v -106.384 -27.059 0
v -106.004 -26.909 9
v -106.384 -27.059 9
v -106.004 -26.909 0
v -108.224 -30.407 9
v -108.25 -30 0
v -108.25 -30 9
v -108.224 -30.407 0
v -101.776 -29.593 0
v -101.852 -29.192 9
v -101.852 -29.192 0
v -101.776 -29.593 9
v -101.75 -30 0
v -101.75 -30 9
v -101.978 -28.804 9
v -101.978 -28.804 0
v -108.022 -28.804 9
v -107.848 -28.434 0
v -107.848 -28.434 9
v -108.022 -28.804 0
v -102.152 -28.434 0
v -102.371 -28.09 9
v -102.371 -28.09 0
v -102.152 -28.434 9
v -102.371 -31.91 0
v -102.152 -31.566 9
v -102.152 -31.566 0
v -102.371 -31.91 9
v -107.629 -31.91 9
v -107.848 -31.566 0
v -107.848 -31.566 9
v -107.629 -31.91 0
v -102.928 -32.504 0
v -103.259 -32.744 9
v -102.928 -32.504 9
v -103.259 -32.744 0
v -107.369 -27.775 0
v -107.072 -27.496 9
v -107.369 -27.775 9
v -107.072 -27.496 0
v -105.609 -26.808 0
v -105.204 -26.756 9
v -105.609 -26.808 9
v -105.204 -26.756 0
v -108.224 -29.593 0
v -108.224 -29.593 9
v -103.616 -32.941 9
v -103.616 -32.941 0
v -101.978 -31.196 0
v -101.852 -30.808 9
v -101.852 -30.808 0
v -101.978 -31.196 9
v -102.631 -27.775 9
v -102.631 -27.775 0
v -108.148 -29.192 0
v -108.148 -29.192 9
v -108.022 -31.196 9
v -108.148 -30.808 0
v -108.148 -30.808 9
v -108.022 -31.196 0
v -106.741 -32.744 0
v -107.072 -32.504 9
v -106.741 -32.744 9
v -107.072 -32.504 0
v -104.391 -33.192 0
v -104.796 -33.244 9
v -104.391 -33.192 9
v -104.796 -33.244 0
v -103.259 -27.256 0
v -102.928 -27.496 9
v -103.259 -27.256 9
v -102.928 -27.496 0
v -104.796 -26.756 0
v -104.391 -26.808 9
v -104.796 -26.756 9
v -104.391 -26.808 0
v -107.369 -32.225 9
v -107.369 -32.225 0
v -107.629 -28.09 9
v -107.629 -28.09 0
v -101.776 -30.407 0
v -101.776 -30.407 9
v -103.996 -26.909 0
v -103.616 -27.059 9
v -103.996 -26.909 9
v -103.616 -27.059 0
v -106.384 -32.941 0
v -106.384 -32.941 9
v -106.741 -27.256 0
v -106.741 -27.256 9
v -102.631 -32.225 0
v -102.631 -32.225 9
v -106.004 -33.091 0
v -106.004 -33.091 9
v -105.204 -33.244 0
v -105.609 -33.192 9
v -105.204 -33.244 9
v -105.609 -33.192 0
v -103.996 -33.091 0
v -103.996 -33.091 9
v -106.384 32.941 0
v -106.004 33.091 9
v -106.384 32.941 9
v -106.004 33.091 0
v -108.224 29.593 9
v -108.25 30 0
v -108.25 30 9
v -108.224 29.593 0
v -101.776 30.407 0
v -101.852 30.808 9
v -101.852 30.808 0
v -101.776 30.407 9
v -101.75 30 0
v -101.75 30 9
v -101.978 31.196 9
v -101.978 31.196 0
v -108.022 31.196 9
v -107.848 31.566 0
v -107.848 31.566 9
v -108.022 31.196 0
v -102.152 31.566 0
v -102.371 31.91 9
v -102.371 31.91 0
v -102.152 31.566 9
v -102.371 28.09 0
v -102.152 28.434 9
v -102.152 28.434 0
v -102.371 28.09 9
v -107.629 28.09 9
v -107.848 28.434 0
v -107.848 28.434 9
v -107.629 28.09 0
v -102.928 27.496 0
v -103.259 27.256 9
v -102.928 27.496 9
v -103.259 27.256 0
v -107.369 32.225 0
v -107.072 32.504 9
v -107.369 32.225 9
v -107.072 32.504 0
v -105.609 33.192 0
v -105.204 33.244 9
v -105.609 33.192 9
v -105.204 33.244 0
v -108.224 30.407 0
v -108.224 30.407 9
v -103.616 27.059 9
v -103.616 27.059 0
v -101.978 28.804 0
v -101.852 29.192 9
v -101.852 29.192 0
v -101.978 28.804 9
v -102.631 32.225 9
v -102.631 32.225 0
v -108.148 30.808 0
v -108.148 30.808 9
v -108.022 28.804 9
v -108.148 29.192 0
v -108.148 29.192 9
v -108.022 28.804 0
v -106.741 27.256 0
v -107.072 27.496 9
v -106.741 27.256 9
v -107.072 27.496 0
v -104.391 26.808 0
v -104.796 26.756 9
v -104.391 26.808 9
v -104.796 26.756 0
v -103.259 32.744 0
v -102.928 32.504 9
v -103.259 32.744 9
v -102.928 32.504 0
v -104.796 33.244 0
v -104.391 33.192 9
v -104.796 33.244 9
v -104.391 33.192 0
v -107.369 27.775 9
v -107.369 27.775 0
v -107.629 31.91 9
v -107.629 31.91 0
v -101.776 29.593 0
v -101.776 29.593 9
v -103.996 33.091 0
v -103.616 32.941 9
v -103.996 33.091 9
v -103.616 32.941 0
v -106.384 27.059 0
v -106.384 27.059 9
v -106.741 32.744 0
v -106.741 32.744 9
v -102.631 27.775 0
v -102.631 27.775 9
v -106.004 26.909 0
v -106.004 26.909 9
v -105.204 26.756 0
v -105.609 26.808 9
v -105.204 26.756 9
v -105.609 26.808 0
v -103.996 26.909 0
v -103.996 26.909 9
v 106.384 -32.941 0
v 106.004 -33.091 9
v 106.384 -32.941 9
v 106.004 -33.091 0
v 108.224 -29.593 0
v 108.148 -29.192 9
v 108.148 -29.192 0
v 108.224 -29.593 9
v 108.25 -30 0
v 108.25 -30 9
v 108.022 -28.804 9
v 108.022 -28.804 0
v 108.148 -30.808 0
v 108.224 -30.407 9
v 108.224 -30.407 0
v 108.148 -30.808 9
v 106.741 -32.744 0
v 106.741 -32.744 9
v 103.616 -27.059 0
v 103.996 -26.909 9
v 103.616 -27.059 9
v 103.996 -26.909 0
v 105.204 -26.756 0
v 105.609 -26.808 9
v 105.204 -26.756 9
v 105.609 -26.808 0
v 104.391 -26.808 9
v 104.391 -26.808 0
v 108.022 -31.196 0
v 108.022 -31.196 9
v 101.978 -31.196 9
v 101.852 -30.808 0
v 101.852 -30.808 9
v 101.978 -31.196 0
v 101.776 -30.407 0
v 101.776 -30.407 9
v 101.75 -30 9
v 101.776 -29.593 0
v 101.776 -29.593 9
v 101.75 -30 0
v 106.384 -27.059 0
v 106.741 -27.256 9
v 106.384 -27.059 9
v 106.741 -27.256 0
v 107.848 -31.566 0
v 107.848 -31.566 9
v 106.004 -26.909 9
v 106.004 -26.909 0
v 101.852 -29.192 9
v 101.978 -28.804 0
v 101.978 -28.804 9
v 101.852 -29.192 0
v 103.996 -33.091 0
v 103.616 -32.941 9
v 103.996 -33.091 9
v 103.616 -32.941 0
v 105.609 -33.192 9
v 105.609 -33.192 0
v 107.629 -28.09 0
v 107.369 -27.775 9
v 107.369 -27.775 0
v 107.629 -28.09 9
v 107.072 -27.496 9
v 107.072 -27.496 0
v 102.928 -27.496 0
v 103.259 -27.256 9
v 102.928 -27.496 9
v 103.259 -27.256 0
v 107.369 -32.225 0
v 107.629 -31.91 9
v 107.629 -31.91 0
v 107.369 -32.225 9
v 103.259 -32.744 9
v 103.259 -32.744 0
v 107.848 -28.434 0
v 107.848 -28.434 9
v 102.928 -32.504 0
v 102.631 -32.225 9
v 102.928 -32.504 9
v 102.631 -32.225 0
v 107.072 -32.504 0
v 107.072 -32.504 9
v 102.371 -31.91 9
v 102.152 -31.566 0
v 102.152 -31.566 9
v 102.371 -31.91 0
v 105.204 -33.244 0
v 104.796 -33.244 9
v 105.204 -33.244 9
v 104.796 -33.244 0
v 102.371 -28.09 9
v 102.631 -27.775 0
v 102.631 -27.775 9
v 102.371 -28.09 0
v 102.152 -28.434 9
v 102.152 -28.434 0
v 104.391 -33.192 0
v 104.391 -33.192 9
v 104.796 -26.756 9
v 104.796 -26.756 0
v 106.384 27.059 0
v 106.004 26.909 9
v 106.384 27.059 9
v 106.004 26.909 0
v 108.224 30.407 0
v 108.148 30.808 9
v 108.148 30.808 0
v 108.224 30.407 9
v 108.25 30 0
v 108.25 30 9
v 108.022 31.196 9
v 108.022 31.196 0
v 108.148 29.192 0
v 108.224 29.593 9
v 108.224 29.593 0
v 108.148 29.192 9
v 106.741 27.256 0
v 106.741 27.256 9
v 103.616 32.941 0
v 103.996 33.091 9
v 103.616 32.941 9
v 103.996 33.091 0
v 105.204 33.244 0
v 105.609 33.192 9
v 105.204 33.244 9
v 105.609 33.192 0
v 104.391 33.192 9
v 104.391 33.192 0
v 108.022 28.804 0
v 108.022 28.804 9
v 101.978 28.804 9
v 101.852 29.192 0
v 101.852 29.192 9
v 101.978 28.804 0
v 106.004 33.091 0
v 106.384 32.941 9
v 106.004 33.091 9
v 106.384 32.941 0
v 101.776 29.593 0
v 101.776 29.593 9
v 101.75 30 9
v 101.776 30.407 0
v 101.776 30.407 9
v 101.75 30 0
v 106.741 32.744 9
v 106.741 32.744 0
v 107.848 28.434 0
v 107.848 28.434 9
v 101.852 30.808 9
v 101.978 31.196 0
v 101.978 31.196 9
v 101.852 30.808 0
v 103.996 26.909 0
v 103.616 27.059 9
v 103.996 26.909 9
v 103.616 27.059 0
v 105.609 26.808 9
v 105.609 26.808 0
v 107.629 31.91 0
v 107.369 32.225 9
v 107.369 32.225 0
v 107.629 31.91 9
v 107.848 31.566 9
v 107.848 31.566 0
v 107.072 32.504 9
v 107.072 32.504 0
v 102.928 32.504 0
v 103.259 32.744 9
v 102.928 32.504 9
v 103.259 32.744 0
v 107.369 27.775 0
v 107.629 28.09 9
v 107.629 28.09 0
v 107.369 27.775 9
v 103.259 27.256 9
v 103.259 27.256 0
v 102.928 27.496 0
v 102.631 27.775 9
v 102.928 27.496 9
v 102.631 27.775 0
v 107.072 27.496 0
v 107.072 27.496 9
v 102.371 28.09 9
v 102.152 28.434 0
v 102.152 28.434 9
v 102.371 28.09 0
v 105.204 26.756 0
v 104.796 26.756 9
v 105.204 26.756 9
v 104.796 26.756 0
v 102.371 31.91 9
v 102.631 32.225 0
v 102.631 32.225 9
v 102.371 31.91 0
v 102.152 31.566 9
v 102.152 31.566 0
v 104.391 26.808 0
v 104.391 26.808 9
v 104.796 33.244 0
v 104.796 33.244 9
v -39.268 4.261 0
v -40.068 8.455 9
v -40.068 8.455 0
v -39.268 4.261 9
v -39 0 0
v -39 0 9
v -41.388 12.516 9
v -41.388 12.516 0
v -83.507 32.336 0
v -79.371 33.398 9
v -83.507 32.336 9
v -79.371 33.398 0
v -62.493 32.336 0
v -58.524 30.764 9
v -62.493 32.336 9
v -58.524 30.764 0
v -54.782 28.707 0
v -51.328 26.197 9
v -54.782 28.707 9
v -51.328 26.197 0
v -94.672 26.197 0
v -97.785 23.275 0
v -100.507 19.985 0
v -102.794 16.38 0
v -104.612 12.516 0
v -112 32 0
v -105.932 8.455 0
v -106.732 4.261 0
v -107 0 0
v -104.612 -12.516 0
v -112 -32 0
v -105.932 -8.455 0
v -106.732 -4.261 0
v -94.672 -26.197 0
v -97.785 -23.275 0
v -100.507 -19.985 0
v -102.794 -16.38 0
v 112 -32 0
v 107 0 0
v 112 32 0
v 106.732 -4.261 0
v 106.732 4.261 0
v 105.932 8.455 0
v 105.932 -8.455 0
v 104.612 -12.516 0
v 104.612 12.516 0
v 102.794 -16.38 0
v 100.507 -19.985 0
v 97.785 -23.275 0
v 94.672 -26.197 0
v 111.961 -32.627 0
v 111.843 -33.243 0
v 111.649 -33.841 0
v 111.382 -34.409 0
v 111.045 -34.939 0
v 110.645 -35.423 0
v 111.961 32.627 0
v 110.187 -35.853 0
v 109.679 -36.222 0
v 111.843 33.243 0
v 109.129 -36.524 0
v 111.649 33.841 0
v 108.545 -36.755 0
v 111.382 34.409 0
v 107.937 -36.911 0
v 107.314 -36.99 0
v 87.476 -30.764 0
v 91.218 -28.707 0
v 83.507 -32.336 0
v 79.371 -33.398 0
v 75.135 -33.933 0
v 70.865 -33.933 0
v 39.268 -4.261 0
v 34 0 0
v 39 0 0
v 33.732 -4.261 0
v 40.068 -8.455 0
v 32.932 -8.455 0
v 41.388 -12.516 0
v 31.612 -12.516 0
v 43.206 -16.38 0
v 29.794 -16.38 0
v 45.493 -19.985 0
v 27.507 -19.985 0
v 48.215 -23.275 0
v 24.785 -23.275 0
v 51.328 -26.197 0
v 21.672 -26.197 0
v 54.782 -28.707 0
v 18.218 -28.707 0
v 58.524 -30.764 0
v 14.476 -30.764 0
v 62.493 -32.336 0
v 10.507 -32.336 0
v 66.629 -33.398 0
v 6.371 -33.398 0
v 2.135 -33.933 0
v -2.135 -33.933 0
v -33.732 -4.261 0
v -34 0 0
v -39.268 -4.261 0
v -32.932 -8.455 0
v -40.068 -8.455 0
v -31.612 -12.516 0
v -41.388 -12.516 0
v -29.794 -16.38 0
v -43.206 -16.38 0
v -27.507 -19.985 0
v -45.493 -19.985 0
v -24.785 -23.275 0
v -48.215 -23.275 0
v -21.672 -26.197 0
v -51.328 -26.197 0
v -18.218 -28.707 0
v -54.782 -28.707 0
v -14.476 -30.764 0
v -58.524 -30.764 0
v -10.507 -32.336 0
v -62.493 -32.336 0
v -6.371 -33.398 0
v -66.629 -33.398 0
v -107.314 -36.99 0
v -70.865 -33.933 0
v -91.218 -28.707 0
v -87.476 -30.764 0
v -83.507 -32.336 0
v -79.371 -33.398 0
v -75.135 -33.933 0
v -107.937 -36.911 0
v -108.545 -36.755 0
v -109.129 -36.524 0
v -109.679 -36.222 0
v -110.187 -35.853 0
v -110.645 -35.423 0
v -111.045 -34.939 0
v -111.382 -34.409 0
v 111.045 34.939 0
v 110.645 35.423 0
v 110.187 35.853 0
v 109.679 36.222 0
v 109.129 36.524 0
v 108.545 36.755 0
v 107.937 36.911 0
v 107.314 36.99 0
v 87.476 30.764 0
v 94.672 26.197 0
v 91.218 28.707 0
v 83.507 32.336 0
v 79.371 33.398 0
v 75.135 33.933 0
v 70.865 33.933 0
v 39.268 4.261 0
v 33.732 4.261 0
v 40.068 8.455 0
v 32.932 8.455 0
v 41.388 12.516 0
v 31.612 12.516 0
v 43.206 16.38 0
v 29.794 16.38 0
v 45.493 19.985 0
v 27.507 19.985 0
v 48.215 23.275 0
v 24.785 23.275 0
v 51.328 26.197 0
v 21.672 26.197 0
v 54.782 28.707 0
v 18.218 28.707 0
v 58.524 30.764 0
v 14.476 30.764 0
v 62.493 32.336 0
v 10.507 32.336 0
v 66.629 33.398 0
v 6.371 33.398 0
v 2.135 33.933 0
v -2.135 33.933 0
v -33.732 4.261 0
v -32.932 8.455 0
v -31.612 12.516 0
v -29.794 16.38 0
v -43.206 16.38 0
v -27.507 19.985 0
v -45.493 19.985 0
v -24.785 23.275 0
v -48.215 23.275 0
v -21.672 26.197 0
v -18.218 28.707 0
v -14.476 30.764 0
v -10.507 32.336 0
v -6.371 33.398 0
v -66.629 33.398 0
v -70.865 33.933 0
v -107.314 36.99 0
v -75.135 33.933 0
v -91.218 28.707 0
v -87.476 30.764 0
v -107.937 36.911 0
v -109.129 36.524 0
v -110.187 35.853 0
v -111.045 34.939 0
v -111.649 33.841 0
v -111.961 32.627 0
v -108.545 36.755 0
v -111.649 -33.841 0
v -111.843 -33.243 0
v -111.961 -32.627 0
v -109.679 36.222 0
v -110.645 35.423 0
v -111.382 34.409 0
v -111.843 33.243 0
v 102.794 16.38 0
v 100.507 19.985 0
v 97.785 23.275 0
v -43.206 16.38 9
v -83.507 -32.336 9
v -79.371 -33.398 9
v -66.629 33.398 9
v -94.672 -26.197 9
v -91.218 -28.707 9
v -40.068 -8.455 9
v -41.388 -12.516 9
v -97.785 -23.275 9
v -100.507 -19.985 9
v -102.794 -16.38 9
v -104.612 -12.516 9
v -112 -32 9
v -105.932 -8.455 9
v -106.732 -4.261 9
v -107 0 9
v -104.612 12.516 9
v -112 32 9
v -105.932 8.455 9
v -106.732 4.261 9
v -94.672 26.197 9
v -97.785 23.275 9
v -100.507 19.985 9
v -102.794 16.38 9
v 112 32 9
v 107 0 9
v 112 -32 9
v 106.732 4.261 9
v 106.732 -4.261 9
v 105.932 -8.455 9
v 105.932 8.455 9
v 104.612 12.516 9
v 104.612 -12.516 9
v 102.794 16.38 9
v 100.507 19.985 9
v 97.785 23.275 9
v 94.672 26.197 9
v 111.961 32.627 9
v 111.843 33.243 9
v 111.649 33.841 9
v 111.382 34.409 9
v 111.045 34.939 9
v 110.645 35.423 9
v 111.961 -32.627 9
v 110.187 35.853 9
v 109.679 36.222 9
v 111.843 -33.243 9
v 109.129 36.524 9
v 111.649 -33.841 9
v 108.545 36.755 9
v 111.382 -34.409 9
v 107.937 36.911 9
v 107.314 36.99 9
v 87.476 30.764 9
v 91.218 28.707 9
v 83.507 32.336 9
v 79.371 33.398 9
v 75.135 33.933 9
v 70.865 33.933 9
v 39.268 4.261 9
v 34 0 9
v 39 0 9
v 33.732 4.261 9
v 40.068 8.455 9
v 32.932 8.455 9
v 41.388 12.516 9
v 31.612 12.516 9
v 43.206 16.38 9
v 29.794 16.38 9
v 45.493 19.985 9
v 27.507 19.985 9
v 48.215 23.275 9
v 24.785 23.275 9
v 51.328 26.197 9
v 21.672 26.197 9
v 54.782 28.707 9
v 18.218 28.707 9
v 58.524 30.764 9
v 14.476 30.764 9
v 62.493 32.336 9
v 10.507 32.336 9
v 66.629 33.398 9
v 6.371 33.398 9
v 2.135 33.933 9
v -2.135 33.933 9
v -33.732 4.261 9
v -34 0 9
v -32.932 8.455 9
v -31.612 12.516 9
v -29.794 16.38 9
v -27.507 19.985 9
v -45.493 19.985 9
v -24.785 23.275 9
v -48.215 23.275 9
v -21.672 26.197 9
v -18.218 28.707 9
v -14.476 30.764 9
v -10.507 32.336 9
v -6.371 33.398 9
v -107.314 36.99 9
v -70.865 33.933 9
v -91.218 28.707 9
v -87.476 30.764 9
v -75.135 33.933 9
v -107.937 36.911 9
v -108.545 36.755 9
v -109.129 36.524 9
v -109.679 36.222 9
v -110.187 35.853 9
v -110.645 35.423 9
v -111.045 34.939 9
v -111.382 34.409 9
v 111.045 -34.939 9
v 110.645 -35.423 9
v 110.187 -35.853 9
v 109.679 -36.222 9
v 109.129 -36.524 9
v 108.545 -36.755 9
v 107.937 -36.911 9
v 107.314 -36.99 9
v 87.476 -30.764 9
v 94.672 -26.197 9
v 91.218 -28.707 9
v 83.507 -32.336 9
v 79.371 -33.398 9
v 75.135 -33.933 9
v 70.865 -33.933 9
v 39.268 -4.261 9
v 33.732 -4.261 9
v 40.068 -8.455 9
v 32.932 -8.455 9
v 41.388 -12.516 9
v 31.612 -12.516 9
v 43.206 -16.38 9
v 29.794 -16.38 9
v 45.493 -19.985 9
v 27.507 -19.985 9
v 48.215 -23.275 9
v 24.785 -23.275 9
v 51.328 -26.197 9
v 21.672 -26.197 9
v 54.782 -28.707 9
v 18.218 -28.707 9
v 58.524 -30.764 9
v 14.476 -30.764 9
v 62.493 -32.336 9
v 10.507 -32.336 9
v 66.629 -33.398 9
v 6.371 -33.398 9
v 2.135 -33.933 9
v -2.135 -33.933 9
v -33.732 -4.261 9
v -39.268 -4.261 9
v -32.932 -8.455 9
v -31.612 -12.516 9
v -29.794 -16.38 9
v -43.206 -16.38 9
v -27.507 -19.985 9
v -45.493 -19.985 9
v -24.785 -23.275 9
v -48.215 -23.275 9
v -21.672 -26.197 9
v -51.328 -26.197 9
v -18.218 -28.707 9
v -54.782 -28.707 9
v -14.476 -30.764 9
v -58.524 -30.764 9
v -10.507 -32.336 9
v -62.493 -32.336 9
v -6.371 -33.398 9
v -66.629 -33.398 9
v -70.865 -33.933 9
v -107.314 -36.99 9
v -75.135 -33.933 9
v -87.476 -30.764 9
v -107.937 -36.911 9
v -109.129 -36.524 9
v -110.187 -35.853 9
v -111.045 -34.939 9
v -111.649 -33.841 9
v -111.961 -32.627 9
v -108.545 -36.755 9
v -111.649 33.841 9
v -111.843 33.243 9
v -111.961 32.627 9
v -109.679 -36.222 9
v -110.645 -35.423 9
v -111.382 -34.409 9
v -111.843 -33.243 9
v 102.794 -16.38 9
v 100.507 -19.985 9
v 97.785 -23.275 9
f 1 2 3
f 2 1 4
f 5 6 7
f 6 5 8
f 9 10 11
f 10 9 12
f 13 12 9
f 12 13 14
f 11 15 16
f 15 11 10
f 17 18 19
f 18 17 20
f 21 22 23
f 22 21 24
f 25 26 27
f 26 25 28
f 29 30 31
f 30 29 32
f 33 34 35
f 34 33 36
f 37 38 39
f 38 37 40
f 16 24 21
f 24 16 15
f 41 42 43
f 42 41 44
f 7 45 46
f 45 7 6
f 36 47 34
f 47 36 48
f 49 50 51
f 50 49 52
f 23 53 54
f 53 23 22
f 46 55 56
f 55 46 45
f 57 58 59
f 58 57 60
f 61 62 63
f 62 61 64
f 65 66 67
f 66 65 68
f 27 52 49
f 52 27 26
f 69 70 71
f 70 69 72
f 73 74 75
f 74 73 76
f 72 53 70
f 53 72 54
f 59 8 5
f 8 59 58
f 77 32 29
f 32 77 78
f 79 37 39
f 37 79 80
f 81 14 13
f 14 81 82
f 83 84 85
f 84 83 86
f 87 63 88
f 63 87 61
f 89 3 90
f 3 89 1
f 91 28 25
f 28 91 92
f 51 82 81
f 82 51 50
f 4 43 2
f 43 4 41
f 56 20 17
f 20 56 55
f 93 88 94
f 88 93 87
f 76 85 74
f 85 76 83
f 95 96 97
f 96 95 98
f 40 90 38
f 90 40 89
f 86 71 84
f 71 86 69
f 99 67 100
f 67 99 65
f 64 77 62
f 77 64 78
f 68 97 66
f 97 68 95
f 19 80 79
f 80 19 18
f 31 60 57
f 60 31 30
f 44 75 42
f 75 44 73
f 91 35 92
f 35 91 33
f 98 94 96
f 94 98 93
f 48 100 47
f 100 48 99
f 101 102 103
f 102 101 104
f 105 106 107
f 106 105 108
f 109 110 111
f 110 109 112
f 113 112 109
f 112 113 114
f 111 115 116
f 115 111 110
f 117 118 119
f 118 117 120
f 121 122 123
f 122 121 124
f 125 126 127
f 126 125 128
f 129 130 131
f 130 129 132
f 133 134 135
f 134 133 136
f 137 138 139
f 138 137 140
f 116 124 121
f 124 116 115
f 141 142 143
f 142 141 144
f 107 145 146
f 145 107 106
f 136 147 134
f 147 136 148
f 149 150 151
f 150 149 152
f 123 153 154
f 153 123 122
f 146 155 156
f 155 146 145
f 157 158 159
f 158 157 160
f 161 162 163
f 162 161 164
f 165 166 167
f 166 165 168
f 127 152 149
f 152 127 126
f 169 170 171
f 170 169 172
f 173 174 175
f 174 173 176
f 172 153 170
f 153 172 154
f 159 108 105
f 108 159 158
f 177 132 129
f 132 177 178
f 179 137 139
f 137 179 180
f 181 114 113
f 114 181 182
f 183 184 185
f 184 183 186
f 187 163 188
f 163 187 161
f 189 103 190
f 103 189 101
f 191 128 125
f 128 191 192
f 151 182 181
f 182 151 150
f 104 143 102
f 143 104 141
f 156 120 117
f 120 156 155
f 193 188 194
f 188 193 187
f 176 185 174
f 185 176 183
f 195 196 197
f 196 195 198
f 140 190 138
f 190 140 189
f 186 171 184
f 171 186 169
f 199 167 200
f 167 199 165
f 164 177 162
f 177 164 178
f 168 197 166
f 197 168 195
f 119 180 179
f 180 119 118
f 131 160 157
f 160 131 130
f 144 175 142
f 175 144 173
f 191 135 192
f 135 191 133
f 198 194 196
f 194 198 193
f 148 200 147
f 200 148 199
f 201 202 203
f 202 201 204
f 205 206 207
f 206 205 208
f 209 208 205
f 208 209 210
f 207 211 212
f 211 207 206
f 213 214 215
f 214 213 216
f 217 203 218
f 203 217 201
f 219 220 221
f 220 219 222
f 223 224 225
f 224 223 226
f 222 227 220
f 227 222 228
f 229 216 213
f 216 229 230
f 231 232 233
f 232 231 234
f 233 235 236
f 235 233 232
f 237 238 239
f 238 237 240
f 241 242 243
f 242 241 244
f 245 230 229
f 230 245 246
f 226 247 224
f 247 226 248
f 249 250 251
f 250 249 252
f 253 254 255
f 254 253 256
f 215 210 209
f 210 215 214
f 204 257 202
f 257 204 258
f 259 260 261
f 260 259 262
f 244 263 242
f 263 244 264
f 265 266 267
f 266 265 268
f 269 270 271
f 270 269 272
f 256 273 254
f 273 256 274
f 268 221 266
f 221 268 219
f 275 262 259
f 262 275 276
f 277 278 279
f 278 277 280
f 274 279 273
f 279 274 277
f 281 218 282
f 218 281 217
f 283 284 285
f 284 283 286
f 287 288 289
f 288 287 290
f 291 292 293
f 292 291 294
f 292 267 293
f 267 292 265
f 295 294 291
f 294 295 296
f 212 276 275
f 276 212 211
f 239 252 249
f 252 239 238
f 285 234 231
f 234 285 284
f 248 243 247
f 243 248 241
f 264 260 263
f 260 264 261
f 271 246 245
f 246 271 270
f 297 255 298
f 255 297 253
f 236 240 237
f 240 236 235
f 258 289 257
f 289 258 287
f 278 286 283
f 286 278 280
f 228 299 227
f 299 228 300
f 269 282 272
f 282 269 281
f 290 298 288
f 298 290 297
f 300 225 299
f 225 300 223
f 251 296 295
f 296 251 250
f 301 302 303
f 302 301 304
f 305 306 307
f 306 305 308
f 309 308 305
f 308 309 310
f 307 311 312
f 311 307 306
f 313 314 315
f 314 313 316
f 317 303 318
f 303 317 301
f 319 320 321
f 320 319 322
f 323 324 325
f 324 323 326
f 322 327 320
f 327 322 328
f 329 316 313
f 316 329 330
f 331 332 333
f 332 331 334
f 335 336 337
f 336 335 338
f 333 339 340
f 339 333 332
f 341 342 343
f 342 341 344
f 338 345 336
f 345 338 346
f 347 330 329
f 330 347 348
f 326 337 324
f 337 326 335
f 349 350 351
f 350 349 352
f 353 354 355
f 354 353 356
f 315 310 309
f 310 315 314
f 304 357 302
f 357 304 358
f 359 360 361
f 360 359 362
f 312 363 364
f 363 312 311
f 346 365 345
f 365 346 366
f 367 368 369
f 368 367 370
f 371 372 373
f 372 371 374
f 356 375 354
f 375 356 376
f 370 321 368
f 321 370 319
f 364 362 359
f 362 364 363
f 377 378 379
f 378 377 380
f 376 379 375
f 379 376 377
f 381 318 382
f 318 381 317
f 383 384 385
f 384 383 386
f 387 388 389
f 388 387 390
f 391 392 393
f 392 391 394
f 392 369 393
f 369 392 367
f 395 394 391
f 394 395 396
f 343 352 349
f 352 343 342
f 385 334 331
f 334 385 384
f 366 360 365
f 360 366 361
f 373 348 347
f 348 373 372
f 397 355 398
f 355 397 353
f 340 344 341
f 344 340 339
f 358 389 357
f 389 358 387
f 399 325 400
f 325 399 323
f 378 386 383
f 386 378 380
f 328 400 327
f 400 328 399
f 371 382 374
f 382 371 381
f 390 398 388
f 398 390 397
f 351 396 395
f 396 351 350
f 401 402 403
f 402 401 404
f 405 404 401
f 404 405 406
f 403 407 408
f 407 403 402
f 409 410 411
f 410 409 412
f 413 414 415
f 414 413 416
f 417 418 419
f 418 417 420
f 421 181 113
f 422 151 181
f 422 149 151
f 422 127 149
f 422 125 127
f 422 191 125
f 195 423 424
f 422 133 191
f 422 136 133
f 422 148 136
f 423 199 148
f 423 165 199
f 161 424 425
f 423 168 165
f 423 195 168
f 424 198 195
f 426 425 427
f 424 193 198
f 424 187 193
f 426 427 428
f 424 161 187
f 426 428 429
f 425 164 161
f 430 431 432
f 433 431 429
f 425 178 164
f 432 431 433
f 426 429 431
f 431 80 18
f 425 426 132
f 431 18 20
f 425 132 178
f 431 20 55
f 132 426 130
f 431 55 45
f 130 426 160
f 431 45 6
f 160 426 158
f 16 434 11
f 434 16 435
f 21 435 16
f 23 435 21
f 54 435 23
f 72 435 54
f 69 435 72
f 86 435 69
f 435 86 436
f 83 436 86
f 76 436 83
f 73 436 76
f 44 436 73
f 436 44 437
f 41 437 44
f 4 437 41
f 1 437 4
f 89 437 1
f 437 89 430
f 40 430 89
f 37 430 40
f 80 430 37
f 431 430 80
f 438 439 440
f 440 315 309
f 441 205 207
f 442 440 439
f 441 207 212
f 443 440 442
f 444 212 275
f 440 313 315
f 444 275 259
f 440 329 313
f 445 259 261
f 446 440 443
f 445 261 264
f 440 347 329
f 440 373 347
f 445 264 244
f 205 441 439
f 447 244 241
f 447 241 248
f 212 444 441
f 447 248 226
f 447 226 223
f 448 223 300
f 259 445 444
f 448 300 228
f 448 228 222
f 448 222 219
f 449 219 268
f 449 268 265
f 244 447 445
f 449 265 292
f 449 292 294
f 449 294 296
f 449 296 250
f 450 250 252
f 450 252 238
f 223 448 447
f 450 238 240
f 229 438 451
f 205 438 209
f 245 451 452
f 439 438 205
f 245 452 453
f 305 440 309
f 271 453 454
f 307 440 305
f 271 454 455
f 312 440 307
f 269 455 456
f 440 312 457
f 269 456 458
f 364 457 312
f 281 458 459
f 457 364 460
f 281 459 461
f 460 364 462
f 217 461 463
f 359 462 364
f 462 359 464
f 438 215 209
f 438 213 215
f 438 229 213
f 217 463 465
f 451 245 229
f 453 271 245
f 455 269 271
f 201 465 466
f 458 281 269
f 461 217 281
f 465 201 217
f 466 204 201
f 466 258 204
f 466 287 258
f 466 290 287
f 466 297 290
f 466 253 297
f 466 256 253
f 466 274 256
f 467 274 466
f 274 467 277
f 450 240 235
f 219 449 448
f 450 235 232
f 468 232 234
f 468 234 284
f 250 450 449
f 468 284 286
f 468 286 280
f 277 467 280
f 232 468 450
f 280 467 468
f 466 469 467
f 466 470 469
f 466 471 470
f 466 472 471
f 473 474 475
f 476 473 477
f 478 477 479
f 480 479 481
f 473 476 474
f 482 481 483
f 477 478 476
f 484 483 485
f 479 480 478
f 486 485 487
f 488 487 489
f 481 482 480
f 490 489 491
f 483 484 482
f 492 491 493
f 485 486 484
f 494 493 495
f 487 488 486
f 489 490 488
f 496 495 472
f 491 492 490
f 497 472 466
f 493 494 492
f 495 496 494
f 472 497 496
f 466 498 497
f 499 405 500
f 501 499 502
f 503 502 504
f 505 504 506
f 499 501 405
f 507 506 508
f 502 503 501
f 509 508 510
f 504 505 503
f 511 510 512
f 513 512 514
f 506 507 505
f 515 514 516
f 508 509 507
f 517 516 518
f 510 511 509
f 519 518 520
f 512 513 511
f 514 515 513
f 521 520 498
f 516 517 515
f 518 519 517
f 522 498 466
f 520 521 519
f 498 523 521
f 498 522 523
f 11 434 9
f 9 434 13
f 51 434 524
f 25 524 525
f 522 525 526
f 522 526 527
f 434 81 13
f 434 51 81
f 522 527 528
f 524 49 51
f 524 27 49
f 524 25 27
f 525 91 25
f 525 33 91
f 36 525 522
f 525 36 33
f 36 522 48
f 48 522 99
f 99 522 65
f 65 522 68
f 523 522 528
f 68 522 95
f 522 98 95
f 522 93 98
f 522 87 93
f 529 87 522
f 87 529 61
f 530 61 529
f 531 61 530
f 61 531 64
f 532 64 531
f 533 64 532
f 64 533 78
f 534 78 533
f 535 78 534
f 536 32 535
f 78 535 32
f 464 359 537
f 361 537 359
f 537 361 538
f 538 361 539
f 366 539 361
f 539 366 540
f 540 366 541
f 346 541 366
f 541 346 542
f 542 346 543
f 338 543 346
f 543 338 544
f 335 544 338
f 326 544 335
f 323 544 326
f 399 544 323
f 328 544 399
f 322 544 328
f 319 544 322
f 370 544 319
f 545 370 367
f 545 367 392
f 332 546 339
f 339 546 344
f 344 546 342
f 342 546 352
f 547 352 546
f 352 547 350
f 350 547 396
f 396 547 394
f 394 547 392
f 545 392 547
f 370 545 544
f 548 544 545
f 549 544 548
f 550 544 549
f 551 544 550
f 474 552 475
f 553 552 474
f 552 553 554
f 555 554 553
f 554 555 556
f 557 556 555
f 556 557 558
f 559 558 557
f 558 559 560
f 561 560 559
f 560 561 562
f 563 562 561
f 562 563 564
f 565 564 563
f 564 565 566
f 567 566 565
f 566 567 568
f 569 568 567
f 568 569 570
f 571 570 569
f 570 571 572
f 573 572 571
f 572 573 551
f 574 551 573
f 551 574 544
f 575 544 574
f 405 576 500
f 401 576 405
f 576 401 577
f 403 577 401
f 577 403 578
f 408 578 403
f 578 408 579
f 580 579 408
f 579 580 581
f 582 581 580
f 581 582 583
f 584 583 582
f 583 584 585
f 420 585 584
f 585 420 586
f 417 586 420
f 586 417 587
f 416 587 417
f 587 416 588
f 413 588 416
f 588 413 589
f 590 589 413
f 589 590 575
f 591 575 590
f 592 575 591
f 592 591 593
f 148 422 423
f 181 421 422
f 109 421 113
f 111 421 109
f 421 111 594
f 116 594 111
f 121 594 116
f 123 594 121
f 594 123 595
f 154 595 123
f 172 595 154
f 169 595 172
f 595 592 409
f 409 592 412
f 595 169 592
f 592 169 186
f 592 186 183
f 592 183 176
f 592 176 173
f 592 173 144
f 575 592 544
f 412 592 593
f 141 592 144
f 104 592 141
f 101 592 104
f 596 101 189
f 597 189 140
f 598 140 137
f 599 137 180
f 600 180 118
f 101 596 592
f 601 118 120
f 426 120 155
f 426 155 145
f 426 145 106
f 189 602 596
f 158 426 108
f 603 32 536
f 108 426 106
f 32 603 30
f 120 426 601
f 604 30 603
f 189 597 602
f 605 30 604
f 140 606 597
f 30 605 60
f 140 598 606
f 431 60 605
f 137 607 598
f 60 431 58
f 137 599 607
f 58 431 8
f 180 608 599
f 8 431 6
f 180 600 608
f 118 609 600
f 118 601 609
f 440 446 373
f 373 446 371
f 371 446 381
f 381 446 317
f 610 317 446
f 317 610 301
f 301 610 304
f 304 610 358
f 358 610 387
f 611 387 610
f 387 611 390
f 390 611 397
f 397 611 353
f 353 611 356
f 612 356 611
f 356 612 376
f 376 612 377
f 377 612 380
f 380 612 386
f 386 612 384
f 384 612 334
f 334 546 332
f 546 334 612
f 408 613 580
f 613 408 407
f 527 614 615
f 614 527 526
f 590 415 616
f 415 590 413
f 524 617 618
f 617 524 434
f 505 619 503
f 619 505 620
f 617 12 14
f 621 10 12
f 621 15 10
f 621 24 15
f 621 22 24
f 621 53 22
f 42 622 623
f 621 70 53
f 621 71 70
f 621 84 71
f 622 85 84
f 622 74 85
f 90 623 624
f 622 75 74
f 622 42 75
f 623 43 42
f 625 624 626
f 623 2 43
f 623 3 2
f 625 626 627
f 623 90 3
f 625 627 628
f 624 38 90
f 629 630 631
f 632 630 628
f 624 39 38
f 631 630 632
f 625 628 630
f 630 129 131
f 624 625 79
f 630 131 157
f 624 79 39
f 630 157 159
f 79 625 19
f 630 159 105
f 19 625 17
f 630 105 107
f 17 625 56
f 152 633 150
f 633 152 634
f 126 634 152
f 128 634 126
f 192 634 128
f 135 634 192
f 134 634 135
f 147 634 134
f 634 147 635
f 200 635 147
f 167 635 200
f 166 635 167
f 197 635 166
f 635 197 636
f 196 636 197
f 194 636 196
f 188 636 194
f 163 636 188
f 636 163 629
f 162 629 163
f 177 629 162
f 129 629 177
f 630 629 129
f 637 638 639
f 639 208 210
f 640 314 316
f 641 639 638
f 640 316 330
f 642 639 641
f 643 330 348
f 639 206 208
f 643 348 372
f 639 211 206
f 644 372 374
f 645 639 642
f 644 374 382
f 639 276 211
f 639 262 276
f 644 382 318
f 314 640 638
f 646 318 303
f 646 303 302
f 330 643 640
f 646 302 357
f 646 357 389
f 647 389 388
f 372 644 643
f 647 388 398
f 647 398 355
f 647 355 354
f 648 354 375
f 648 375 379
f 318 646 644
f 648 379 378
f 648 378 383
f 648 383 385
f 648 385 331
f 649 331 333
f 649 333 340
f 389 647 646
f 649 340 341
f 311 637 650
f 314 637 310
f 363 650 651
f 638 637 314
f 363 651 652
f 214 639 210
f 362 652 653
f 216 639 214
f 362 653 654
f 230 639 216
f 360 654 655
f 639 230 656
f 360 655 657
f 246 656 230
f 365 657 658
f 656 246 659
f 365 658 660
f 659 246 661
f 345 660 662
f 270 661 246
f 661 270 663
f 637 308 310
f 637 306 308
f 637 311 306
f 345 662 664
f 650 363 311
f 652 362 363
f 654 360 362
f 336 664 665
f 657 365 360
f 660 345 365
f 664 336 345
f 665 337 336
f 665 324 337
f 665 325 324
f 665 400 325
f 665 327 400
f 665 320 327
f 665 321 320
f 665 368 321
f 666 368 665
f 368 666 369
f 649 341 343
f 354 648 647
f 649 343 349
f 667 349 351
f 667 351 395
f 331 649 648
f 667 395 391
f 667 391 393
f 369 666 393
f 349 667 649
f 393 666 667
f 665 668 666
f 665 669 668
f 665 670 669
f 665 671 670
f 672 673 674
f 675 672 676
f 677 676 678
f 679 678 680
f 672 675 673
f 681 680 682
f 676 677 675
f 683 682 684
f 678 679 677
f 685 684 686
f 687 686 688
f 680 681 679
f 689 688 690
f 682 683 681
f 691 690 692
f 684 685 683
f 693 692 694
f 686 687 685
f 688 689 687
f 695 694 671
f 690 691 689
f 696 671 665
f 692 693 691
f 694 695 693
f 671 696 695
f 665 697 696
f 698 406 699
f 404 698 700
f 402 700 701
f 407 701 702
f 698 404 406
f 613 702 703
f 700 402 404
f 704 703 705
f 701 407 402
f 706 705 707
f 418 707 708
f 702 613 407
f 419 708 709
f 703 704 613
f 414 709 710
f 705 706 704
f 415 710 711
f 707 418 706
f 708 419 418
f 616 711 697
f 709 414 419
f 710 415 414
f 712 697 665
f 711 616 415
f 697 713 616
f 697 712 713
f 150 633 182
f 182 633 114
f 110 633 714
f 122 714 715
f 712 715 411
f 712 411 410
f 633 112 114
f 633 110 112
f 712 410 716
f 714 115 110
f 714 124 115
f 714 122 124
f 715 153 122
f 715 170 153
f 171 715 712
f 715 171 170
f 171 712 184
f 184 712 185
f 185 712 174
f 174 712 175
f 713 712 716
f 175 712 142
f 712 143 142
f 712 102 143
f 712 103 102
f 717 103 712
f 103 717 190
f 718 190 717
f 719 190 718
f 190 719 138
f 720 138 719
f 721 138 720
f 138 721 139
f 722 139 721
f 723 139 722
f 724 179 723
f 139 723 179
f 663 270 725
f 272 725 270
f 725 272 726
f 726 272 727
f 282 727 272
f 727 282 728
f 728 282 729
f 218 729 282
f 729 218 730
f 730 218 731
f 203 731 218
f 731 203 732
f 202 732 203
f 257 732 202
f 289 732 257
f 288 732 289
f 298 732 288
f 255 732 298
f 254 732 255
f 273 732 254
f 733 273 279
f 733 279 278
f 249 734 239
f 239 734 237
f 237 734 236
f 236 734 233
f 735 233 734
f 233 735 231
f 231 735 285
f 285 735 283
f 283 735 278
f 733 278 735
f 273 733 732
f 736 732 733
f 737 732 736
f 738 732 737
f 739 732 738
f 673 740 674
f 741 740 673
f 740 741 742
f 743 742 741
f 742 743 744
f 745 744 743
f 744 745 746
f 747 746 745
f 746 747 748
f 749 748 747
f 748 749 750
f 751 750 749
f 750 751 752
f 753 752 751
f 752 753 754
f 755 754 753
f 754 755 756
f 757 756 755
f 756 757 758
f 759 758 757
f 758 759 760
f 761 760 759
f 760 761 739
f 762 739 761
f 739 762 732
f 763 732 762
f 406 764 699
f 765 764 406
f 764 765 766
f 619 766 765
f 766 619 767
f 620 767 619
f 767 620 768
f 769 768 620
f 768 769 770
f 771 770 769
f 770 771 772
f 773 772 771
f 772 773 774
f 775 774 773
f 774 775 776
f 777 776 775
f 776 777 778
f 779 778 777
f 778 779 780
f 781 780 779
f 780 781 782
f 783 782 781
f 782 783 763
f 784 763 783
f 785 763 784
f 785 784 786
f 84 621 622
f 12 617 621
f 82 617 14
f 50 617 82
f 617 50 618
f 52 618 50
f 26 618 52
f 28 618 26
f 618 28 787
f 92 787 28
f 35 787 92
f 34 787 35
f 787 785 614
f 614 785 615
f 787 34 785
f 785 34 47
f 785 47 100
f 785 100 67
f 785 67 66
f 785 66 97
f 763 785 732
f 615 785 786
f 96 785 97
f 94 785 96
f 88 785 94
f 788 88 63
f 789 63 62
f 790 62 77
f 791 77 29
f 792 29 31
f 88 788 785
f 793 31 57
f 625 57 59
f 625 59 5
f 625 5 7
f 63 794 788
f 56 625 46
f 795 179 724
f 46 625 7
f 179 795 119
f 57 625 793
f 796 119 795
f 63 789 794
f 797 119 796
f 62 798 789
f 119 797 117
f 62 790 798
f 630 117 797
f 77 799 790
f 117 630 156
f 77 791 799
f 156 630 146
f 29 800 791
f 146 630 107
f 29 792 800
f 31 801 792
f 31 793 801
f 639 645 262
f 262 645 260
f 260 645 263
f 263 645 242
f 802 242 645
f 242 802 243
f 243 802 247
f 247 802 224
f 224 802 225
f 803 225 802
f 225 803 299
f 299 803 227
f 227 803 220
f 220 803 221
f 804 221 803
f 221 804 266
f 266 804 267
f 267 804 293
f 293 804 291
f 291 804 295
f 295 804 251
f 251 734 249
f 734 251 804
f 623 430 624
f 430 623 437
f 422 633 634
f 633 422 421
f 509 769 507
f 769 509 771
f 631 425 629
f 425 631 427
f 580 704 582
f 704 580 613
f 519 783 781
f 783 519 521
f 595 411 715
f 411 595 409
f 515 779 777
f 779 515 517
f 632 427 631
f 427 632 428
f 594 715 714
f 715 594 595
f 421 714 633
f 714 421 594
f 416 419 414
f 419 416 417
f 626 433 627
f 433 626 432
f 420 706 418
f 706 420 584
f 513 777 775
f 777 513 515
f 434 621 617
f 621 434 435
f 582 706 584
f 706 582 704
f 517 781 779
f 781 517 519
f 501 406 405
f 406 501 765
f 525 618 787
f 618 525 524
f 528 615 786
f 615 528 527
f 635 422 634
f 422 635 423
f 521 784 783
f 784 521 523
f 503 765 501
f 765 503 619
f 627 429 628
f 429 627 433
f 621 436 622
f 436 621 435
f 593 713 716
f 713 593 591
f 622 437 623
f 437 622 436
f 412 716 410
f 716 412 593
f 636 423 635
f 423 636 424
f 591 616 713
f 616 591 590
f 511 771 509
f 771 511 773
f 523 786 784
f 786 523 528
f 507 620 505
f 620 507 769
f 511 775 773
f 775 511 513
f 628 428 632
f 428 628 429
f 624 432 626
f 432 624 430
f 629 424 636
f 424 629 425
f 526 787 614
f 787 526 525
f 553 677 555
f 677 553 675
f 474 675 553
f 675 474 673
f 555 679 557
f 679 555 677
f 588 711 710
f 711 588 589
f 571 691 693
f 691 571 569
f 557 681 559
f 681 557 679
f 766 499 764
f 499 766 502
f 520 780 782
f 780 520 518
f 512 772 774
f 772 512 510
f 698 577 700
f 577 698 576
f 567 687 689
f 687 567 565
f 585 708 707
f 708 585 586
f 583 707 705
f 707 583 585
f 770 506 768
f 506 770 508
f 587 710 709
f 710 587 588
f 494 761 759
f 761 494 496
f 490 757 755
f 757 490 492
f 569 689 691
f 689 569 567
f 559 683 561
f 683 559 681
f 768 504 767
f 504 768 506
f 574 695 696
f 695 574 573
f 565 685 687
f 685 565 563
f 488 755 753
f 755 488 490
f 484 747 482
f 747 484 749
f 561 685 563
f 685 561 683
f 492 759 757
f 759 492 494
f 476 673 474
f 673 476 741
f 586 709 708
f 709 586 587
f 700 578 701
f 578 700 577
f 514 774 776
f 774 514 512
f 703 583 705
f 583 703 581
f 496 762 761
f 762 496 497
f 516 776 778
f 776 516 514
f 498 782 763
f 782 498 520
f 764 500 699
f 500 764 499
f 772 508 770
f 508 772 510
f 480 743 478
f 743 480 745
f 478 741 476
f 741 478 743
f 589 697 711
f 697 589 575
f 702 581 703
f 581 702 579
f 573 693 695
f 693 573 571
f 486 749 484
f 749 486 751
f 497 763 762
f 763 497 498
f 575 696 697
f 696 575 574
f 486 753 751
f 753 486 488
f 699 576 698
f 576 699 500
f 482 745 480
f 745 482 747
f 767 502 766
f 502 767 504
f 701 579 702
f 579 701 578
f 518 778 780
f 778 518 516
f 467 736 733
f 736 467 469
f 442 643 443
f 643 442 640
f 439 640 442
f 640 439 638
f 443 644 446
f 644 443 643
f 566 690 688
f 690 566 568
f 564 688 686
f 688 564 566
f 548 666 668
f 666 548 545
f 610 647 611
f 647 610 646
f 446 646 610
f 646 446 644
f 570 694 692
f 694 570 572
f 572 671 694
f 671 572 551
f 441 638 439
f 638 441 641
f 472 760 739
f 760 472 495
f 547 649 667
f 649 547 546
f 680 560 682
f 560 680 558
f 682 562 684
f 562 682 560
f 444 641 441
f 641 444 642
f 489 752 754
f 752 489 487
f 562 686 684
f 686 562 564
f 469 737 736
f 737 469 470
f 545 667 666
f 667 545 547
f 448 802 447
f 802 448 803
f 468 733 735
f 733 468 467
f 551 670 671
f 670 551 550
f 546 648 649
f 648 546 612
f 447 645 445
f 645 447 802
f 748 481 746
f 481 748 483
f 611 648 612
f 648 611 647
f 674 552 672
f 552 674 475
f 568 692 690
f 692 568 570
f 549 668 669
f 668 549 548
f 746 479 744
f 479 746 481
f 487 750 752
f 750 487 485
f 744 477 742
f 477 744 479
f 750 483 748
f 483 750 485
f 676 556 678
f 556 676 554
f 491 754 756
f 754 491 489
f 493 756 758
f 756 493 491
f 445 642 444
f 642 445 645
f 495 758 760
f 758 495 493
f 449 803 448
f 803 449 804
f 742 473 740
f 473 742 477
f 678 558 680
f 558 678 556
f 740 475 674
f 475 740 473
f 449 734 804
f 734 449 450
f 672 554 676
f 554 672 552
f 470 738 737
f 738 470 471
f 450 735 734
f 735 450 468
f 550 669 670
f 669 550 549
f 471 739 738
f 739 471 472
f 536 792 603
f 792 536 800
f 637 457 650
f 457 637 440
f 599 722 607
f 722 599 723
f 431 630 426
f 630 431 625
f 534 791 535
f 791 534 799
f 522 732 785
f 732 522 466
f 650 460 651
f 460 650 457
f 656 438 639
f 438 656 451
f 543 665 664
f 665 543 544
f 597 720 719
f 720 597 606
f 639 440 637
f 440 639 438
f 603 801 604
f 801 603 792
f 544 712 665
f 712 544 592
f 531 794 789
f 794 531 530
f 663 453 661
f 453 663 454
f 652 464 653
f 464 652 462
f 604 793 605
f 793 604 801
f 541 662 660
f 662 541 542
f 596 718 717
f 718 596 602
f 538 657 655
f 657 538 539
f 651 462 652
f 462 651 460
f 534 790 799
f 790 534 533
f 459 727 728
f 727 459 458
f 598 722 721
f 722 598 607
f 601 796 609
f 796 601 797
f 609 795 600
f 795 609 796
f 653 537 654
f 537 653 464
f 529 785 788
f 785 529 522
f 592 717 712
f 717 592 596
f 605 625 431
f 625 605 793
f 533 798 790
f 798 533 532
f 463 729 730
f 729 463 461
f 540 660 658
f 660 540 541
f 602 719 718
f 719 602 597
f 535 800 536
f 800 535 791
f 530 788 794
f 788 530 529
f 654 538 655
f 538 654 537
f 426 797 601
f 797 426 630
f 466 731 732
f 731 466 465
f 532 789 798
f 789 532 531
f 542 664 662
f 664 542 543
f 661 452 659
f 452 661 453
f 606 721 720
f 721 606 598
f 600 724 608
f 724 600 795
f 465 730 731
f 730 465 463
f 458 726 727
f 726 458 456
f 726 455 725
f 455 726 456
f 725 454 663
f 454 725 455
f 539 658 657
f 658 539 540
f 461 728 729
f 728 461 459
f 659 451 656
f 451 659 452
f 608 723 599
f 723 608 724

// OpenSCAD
$fn = 50;


difference() {
	union() {
		hull() {
			translate(v = [-107.0000000000, 32.0000000000, 0]) {
				cylinder(h = 9, r = 5);
			}
			translate(v = [107.0000000000, 32.0000000000, 0]) {
				cylinder(h = 9, r = 5);
			}
			translate(v = [-107.0000000000, -32.0000000000, 0]) {
				cylinder(h = 9, r = 5);
			}
			translate(v = [107.0000000000, -32.0000000000, 0]) {
				cylinder(h = 9, r = 5);
			}
		}
	}
	union() {
		#translate(v = [-105.0000000000, -30.0000000000, -100.0000000000]) {
			cylinder(h = 200, r = 3.2500000000);
		}
		#translate(v = [-105.0000000000, 30.0000000000, -100.0000000000]) {
			cylinder(h = 200, r = 3.2500000000);
		}
		#translate(v = [105.0000000000, -30.0000000000, -100.0000000000]) {
			cylinder(h = 200, r = 3.2500000000);
		}
		#translate(v = [105.0000000000, 30.0000000000, -100.0000000000]) {
			cylinder(h = 200, r = 3.2500000000);
		}
		#translate(v = [-73.0000000000, 0, 0]) {
			cylinder(h = 9, r = 34.0000000000);
		}
		#cylinder(h = 9, r = 34.0000000000);
		#translate(v = [73.0000000000, 0, 0]) {
			cylinder(h = 9, r = 34.0000000000);
		}
	}
}
